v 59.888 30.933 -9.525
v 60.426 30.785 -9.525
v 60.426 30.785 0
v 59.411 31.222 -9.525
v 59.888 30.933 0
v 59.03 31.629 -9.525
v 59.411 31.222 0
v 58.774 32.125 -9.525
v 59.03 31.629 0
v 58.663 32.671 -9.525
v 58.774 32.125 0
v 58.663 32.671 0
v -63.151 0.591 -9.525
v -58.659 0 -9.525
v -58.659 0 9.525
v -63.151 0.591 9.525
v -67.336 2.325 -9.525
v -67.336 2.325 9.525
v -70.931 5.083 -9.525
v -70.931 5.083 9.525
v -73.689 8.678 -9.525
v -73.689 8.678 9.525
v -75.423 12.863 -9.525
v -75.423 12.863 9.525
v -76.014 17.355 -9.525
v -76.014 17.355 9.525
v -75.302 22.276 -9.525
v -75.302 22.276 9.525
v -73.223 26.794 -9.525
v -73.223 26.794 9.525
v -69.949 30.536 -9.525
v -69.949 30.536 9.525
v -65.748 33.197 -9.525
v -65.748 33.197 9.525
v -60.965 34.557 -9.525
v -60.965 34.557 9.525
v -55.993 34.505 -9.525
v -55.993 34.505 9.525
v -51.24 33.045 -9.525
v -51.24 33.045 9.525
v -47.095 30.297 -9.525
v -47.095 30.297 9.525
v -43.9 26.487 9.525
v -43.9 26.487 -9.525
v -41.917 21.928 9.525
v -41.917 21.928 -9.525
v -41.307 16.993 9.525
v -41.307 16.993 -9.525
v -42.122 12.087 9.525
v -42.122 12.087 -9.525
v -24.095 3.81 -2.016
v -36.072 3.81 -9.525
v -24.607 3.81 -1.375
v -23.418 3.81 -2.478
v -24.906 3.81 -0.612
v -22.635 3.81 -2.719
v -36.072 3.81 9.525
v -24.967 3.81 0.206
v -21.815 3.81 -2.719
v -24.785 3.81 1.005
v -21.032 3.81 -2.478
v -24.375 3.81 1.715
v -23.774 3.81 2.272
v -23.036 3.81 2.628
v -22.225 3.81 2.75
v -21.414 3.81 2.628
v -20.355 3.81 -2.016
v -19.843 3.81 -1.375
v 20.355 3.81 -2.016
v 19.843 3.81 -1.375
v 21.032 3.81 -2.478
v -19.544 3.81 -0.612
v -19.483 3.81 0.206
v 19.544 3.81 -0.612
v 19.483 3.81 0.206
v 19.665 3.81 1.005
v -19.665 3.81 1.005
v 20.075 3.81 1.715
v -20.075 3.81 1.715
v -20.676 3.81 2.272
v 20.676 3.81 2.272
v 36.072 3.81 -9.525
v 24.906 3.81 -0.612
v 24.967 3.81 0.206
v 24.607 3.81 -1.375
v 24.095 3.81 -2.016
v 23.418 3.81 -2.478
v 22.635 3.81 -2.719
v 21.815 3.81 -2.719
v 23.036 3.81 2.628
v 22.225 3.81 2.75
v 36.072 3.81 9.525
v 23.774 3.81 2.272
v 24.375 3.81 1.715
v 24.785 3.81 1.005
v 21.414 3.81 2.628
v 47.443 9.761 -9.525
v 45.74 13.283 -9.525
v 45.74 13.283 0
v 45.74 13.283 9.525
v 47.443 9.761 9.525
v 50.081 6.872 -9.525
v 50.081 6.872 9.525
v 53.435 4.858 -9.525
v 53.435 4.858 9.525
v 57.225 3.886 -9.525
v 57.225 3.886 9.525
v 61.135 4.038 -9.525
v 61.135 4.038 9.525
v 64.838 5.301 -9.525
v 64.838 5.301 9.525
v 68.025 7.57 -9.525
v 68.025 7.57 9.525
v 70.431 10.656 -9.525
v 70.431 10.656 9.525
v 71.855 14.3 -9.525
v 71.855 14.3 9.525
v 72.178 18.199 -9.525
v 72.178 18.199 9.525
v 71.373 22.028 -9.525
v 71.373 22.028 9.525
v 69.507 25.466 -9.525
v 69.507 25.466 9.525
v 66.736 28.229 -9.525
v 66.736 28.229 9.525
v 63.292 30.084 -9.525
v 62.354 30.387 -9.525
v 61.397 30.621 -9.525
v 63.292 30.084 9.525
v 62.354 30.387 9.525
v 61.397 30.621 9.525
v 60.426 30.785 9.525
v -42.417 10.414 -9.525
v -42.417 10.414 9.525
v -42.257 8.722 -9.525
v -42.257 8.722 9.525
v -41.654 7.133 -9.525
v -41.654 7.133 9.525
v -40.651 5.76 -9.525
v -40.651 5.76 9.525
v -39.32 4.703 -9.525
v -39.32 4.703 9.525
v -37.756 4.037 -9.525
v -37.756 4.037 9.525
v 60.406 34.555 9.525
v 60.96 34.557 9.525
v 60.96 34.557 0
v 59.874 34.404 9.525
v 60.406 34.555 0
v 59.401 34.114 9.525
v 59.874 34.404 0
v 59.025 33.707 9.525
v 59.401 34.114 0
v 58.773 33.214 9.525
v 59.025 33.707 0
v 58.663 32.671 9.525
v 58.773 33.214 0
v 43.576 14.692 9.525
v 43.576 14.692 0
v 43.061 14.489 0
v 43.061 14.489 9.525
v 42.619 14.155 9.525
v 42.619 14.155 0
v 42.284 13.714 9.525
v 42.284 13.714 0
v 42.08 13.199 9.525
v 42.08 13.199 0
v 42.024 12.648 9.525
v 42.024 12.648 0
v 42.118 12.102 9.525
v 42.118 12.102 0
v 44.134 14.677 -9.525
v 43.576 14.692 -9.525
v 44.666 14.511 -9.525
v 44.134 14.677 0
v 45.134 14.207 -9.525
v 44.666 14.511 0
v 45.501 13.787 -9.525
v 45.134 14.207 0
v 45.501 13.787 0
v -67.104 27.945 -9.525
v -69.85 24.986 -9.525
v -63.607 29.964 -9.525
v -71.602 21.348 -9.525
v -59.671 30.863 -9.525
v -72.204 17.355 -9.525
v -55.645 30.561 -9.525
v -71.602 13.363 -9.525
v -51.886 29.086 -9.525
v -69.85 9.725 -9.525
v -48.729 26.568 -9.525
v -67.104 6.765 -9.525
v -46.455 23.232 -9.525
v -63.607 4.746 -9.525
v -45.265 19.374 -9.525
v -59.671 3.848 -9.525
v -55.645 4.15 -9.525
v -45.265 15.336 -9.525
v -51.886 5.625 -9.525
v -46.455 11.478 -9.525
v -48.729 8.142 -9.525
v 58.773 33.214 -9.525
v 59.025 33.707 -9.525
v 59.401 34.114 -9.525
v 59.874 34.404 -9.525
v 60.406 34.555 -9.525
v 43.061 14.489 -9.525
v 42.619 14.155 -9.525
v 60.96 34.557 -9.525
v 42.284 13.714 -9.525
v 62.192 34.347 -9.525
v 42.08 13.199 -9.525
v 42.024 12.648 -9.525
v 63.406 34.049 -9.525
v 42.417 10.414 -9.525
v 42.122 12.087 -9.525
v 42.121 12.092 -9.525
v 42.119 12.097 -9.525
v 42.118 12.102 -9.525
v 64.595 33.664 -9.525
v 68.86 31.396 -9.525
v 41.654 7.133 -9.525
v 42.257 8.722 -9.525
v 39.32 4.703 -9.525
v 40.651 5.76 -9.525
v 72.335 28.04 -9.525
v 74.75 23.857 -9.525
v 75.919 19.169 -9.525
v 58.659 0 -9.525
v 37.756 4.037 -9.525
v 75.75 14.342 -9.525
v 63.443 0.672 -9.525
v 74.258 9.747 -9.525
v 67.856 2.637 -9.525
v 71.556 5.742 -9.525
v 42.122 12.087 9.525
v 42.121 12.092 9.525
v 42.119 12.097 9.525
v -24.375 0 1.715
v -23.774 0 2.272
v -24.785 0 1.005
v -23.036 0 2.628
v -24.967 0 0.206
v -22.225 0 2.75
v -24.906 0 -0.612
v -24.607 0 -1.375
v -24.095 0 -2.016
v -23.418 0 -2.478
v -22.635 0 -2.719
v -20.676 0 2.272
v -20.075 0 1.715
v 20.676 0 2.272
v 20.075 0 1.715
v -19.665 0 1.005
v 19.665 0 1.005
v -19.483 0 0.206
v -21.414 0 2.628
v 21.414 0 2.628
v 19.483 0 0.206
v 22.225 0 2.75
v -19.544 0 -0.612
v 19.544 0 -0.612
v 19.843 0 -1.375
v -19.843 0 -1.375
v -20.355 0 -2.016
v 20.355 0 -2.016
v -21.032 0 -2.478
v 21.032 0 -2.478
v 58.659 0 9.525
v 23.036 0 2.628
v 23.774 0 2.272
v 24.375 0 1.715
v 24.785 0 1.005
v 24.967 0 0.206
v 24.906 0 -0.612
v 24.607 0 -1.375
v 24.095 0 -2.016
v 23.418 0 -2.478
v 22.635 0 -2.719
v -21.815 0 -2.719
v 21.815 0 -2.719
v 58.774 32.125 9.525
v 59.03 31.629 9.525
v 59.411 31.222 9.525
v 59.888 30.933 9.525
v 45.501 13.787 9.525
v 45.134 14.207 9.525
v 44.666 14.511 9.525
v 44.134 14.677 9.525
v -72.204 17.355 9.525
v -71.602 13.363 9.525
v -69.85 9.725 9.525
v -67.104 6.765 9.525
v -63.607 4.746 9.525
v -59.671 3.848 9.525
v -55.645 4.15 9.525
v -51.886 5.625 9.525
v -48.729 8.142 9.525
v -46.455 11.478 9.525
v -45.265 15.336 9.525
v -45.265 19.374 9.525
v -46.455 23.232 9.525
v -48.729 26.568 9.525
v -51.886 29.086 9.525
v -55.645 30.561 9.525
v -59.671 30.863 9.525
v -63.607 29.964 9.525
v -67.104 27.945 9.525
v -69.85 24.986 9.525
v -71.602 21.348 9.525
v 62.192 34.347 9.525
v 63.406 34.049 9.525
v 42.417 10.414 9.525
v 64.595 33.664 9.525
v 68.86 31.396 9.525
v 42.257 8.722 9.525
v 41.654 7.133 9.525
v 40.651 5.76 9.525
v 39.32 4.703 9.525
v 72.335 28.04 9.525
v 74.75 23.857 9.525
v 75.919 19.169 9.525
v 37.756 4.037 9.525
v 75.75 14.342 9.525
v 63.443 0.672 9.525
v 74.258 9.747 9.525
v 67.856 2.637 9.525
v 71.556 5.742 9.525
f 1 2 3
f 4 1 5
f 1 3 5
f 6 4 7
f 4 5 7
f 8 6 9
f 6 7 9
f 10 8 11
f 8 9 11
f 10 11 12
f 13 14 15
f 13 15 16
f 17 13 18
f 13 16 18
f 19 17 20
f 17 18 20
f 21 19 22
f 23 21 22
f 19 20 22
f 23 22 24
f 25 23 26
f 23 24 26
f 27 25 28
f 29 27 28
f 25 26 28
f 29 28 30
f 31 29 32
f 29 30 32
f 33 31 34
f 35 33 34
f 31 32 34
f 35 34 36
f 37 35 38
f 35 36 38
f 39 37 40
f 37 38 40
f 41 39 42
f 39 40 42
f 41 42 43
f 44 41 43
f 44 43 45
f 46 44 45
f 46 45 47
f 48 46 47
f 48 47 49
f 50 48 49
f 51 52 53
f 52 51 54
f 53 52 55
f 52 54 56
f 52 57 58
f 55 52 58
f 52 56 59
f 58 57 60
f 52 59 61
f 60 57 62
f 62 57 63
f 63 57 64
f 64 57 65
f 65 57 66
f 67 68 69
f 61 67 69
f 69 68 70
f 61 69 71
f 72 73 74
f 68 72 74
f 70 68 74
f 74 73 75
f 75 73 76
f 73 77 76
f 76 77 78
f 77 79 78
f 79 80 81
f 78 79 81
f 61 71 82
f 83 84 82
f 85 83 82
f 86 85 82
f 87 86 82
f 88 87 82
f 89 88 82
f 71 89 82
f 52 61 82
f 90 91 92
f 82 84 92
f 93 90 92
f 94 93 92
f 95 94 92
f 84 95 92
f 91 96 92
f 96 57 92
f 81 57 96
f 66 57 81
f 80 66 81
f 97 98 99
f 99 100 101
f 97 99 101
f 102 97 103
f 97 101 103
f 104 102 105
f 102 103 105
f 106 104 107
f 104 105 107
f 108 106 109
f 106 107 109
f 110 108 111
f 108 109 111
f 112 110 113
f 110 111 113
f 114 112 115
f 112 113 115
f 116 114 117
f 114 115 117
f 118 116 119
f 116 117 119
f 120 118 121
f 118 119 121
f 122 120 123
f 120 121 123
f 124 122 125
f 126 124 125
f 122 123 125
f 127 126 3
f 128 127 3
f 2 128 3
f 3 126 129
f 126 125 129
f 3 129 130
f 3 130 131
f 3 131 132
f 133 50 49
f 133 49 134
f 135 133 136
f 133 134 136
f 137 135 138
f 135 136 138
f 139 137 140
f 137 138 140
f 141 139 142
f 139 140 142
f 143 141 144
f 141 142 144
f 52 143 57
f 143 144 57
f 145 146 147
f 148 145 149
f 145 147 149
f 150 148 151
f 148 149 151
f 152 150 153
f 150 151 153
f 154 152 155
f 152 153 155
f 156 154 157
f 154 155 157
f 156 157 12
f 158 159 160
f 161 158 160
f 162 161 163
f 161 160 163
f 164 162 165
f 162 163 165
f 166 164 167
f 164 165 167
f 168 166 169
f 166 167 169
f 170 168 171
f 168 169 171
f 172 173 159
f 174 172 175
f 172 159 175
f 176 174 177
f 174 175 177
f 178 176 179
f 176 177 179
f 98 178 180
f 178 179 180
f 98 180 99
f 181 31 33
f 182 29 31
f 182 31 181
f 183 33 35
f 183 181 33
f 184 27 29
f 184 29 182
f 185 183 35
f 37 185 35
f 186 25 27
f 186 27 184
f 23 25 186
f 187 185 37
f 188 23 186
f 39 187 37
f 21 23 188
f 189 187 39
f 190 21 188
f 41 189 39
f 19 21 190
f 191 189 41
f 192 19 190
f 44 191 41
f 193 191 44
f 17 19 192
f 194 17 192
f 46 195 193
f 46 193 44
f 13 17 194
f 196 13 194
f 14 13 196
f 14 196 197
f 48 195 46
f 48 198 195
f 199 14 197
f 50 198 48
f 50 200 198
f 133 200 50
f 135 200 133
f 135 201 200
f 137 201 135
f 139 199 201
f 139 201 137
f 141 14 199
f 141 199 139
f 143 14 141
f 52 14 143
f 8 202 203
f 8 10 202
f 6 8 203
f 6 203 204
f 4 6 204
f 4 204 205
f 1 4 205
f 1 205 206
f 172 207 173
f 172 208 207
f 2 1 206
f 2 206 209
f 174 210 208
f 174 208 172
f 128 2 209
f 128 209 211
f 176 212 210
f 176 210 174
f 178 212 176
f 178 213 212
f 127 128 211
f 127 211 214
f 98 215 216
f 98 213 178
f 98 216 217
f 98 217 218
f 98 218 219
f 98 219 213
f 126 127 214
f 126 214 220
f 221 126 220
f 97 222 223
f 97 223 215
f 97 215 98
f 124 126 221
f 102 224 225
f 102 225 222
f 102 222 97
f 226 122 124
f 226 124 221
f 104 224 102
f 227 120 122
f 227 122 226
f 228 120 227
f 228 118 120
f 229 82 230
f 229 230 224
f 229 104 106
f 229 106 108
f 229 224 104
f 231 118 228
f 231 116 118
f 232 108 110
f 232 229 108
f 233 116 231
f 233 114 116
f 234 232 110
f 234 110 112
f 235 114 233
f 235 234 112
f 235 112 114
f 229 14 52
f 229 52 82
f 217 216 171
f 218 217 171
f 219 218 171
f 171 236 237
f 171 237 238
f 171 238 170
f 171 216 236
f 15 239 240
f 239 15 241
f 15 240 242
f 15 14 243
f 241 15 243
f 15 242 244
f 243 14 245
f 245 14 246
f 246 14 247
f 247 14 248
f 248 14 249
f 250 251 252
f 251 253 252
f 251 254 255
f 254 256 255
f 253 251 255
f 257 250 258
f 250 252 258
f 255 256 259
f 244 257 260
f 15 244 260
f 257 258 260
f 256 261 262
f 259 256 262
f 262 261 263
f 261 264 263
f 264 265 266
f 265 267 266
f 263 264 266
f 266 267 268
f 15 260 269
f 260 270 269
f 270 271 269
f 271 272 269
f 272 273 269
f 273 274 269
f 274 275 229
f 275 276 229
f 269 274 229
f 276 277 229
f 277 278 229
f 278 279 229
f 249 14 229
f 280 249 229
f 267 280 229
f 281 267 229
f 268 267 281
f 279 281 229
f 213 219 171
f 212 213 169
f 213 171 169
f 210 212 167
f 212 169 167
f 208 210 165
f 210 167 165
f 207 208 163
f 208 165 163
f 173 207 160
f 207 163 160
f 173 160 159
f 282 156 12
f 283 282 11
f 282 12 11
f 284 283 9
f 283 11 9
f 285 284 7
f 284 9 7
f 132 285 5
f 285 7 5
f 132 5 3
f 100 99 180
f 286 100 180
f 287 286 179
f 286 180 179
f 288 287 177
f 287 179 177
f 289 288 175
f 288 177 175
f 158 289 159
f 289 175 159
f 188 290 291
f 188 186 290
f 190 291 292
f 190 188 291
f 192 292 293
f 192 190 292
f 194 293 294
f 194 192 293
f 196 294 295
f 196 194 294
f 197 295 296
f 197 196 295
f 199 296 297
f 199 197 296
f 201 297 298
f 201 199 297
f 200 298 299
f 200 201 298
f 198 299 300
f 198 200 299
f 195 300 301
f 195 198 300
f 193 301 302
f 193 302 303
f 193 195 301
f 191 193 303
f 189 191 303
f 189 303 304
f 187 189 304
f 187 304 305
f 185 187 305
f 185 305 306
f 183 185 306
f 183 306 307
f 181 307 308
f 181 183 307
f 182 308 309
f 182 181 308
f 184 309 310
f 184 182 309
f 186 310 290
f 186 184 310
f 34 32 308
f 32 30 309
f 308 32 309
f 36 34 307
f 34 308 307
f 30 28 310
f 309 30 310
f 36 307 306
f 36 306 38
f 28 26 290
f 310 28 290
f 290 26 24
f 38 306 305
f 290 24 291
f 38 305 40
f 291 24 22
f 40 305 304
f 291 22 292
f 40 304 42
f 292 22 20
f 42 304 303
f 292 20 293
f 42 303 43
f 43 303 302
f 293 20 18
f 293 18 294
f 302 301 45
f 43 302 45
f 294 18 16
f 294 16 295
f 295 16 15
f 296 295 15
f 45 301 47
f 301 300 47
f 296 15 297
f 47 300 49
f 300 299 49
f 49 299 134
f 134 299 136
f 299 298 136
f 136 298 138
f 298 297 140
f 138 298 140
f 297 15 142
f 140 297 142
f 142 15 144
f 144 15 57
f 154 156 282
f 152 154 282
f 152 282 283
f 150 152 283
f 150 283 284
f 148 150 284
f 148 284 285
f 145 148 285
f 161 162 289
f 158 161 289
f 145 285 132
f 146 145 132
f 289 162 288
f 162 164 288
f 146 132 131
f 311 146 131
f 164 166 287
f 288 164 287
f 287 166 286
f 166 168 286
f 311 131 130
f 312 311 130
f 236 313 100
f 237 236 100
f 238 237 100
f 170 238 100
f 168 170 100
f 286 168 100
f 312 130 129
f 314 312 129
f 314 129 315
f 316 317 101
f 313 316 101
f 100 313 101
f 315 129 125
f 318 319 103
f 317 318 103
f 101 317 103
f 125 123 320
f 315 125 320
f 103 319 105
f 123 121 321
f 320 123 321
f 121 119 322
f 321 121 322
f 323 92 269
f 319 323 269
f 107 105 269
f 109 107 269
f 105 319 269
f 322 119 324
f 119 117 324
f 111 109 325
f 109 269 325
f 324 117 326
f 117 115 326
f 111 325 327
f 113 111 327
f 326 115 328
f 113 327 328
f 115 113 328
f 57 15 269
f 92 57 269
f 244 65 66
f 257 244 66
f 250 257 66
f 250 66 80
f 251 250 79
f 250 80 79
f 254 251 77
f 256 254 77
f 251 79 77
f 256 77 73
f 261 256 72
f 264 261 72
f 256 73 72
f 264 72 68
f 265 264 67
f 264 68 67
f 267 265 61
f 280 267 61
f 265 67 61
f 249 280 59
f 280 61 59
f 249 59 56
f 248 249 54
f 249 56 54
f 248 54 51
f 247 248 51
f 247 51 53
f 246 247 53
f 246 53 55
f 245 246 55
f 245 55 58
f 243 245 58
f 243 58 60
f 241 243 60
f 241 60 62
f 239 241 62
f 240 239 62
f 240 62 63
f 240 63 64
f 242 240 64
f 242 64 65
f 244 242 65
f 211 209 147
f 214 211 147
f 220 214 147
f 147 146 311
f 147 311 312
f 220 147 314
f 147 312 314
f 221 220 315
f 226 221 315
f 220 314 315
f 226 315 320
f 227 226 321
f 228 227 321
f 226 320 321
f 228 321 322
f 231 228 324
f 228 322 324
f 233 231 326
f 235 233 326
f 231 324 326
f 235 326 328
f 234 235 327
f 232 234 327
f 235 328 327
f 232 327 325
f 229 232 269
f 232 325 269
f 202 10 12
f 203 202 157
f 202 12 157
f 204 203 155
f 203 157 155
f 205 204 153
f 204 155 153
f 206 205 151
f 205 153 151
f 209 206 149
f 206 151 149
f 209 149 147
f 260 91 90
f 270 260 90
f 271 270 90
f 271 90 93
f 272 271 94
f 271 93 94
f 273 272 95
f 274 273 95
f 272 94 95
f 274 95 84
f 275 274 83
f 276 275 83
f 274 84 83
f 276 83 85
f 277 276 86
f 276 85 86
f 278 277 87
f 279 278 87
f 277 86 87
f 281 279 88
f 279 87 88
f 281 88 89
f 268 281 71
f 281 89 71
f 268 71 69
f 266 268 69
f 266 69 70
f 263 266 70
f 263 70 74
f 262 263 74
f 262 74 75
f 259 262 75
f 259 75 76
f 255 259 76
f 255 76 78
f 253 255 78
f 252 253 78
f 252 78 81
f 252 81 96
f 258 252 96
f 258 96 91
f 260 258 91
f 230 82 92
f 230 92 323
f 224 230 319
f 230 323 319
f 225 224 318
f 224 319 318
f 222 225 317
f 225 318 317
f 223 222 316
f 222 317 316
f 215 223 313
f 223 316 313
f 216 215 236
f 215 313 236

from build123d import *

# Parameters (mm, degrees)
SKETCH3_W           = 114.3
SKETCH3_H           = 19.05
BOSS_EXTRUDE1_DEPTH = 3.81
SKETCH4_R           = 13.5453125
BOSS_EXTRUDE2_DEPTH = 9.525
FILLET1_R           = 2.032
SKETCH5_R           = 2.75
CUT_EXTRUDE4_DEPTH  = 12.7


with BuildPart() as part:
    # Sketch3 → Boss-Extrude1 (new body)
    with BuildSketch(Plane(origin=(0, 0, 0), x_dir=(1, 0, 0), z_dir=(0, 1, 0))):
        Rectangle(SKETCH3_W, SKETCH3_H)
    extrude(amount=BOSS_EXTRUDE1_DEPTH)

    # Sketch4 → Boss-Extrude2 (add, symmetric)
    with BuildSketch(Plane.XY):
        with BuildLine():
            Line((-36.071859255, 3.81), (36.071859255, 3.81))
            ThreePointArc((36.071859255, 3.81), (41.198342199, 6.412778013), (42.122274879, 12.087425946))
            ThreePointArc((42.122274879, 12.087425946), (41.806974837, 13.2052175), (41.567140999, 14.341594112))
            Line((41.567140999, 14.341594112), (45.319258538, 15.003193668))
            ThreePointArc((45.319258538, 15.003193668), (67.365546349, 6.979001129), (63.291557028, 30.083742702))
            ThreePointArc((63.291557028, 30.083742702), (61.010906137, 30.694841267), (58.658787305, 30.900625))
            Line((58.658787305, 30.900625), (58.658787305, 34.710625))
            ThreePointArc((58.658787305, 34.710625), (61.672505693, 34.446958806), (64.594653774, 33.663971588))
            ThreePointArc((64.594653774, 33.663971588), (75.750433611, 14.341594112), (58.658787305, 0))
            Line((58.658787305, 0), (-58.658787305, 0))
            ThreePointArc((-58.658787305, 0), (-70.930846463, 5.083253342), (-76.014099805, 17.3553125))
            ThreePointArc((-76.014099805, 17.3553125), (-55.993216901, 34.504703346), (-42.122274879, 12.087425946))
            ThreePointArc((-42.122274879, 12.087425946), (-41.198342199, 6.412778013), (-36.071859255, 3.81))
        make_face()
        with Locations(Location((-58.658787305, 17.3553125, 0), (0, 0, 180))):
            Circle(SKETCH4_R, mode=Mode.SUBTRACT)
    extrude(amount=BOSS_EXTRUDE2_DEPTH, both=True)

    # Fillet1
    # the kernel refuses this fillet: 2.032 mm, written as the material it takes off along each edge
    with BuildSketch(Plane(origin=(58.658787305, 34.710625, 0), x_dir=(0, -1, 0), z_dir=(0, 0, -1)), Plane(origin=(41.567140999, 14.341594112, 0), x_dir=(0.9848077530122078, 0.17364817766693208, 0), z_dir=(0, 0, 1))) as fillet1_piece_1:
        with BuildLine():
            CenterArc((2.16732771, -2.032), FILLET1_R, 90, 97.620348072)
            ThreePointArc((0.153273302, -2.301460275), (0.03836072, -1.153279249), (0, 0))
            Line((0, 0), (2.16732771, 0))
        make_face()
    extrude(amount=15.291396244, mode=Mode.SUBTRACT)
    with BuildSketch(Plane(origin=(58.658787305, 30.900625, 0), x_dir=(0.9978615634411592, -0.06536283505758803, 0), z_dir=(0, 0, -1)), Plane(origin=(45.319258538, 15.003193668, 0), x_dir=(0.23764666877900192, -0.9713516669148425, 0), z_dir=(0, 0, 1))) as fillet1_piece_2:
        with BuildLine():
            CenterArc((1.903537334, -2.027654697), FILLET1_R, 93.747686363, 82.504627273)
            Line((-0.124117363, -1.894837416), (0, 0))
            ThreePointArc((0, 0), (0.885360027, -0.028965791), (1.770720053, 0))
        make_face()
    extrude(amount=14.272245223, mode=Mode.SUBTRACT)
    with BuildSketch(Plane(origin=(45.319258538, 15.003193668, 0), x_dir=(-0.9848077530122076, -0.17364817766693288, 0), z_dir=(0, 0, -1)), Plane(origin=(58.658787305, 30.900625, 0), x_dir=(0, 1, 0), z_dir=(0, 0, 1))) as fillet1_piece_3:
        with BuildLine():
            CenterArc((1.898898089, -2.032), FILLET1_R, 90, 82.504627273)
            ThreePointArc((-0.115739283, -1.766933481), (-0.028965791, -0.885360027), (0, 0))
            Line((0, 0), (1.898898089, 0))
        make_face()
    extrude(amount=14.272245223, mode=Mode.SUBTRACT)
    with BuildSketch(Plane(origin=(41.567140999, 14.341594112, 0), x_dir=(0.23870589854739682, -0.9710919081110089, 0), z_dir=(0, 0, -1)), Plane(origin=(58.658787305, 34.710625, 0), x_dir=(0.9977896842762429, -0.06645107938864023, 0), z_dir=(0, 0, 1))) as fillet1_piece_4:
        with BuildLine():
            CenterArc((2.171529904, -2.027508638), FILLET1_R, 86.189825964, 97.620348072)
            Line((0.144021266, -2.162537232), (0, 0))
            ThreePointArc((0, 0), (1.153279249, 0.03836072), (2.306558498, 0))
        make_face()
    extrude(amount=15.291396244, mode=Mode.SUBTRACT)

    # Sketch5 → Cut-Extrude4 (cut)
    with BuildSketch(Plane(origin=(0, 3.81, 0), x_dir=(1, 0, 0), z_dir=(0, 1, 0))):
        with Locations(Location((-22.225, 0, 0), (0, 0, 270))):
            Circle(SKETCH5_R)
        with Locations(Location((22.225, 0, 0), (0, 0, 270))):
            Circle(SKETCH5_R)
    extrude(amount=-CUT_EXTRUDE4_DEPTH, mode=Mode.SUBTRACT)


solid = part.part
